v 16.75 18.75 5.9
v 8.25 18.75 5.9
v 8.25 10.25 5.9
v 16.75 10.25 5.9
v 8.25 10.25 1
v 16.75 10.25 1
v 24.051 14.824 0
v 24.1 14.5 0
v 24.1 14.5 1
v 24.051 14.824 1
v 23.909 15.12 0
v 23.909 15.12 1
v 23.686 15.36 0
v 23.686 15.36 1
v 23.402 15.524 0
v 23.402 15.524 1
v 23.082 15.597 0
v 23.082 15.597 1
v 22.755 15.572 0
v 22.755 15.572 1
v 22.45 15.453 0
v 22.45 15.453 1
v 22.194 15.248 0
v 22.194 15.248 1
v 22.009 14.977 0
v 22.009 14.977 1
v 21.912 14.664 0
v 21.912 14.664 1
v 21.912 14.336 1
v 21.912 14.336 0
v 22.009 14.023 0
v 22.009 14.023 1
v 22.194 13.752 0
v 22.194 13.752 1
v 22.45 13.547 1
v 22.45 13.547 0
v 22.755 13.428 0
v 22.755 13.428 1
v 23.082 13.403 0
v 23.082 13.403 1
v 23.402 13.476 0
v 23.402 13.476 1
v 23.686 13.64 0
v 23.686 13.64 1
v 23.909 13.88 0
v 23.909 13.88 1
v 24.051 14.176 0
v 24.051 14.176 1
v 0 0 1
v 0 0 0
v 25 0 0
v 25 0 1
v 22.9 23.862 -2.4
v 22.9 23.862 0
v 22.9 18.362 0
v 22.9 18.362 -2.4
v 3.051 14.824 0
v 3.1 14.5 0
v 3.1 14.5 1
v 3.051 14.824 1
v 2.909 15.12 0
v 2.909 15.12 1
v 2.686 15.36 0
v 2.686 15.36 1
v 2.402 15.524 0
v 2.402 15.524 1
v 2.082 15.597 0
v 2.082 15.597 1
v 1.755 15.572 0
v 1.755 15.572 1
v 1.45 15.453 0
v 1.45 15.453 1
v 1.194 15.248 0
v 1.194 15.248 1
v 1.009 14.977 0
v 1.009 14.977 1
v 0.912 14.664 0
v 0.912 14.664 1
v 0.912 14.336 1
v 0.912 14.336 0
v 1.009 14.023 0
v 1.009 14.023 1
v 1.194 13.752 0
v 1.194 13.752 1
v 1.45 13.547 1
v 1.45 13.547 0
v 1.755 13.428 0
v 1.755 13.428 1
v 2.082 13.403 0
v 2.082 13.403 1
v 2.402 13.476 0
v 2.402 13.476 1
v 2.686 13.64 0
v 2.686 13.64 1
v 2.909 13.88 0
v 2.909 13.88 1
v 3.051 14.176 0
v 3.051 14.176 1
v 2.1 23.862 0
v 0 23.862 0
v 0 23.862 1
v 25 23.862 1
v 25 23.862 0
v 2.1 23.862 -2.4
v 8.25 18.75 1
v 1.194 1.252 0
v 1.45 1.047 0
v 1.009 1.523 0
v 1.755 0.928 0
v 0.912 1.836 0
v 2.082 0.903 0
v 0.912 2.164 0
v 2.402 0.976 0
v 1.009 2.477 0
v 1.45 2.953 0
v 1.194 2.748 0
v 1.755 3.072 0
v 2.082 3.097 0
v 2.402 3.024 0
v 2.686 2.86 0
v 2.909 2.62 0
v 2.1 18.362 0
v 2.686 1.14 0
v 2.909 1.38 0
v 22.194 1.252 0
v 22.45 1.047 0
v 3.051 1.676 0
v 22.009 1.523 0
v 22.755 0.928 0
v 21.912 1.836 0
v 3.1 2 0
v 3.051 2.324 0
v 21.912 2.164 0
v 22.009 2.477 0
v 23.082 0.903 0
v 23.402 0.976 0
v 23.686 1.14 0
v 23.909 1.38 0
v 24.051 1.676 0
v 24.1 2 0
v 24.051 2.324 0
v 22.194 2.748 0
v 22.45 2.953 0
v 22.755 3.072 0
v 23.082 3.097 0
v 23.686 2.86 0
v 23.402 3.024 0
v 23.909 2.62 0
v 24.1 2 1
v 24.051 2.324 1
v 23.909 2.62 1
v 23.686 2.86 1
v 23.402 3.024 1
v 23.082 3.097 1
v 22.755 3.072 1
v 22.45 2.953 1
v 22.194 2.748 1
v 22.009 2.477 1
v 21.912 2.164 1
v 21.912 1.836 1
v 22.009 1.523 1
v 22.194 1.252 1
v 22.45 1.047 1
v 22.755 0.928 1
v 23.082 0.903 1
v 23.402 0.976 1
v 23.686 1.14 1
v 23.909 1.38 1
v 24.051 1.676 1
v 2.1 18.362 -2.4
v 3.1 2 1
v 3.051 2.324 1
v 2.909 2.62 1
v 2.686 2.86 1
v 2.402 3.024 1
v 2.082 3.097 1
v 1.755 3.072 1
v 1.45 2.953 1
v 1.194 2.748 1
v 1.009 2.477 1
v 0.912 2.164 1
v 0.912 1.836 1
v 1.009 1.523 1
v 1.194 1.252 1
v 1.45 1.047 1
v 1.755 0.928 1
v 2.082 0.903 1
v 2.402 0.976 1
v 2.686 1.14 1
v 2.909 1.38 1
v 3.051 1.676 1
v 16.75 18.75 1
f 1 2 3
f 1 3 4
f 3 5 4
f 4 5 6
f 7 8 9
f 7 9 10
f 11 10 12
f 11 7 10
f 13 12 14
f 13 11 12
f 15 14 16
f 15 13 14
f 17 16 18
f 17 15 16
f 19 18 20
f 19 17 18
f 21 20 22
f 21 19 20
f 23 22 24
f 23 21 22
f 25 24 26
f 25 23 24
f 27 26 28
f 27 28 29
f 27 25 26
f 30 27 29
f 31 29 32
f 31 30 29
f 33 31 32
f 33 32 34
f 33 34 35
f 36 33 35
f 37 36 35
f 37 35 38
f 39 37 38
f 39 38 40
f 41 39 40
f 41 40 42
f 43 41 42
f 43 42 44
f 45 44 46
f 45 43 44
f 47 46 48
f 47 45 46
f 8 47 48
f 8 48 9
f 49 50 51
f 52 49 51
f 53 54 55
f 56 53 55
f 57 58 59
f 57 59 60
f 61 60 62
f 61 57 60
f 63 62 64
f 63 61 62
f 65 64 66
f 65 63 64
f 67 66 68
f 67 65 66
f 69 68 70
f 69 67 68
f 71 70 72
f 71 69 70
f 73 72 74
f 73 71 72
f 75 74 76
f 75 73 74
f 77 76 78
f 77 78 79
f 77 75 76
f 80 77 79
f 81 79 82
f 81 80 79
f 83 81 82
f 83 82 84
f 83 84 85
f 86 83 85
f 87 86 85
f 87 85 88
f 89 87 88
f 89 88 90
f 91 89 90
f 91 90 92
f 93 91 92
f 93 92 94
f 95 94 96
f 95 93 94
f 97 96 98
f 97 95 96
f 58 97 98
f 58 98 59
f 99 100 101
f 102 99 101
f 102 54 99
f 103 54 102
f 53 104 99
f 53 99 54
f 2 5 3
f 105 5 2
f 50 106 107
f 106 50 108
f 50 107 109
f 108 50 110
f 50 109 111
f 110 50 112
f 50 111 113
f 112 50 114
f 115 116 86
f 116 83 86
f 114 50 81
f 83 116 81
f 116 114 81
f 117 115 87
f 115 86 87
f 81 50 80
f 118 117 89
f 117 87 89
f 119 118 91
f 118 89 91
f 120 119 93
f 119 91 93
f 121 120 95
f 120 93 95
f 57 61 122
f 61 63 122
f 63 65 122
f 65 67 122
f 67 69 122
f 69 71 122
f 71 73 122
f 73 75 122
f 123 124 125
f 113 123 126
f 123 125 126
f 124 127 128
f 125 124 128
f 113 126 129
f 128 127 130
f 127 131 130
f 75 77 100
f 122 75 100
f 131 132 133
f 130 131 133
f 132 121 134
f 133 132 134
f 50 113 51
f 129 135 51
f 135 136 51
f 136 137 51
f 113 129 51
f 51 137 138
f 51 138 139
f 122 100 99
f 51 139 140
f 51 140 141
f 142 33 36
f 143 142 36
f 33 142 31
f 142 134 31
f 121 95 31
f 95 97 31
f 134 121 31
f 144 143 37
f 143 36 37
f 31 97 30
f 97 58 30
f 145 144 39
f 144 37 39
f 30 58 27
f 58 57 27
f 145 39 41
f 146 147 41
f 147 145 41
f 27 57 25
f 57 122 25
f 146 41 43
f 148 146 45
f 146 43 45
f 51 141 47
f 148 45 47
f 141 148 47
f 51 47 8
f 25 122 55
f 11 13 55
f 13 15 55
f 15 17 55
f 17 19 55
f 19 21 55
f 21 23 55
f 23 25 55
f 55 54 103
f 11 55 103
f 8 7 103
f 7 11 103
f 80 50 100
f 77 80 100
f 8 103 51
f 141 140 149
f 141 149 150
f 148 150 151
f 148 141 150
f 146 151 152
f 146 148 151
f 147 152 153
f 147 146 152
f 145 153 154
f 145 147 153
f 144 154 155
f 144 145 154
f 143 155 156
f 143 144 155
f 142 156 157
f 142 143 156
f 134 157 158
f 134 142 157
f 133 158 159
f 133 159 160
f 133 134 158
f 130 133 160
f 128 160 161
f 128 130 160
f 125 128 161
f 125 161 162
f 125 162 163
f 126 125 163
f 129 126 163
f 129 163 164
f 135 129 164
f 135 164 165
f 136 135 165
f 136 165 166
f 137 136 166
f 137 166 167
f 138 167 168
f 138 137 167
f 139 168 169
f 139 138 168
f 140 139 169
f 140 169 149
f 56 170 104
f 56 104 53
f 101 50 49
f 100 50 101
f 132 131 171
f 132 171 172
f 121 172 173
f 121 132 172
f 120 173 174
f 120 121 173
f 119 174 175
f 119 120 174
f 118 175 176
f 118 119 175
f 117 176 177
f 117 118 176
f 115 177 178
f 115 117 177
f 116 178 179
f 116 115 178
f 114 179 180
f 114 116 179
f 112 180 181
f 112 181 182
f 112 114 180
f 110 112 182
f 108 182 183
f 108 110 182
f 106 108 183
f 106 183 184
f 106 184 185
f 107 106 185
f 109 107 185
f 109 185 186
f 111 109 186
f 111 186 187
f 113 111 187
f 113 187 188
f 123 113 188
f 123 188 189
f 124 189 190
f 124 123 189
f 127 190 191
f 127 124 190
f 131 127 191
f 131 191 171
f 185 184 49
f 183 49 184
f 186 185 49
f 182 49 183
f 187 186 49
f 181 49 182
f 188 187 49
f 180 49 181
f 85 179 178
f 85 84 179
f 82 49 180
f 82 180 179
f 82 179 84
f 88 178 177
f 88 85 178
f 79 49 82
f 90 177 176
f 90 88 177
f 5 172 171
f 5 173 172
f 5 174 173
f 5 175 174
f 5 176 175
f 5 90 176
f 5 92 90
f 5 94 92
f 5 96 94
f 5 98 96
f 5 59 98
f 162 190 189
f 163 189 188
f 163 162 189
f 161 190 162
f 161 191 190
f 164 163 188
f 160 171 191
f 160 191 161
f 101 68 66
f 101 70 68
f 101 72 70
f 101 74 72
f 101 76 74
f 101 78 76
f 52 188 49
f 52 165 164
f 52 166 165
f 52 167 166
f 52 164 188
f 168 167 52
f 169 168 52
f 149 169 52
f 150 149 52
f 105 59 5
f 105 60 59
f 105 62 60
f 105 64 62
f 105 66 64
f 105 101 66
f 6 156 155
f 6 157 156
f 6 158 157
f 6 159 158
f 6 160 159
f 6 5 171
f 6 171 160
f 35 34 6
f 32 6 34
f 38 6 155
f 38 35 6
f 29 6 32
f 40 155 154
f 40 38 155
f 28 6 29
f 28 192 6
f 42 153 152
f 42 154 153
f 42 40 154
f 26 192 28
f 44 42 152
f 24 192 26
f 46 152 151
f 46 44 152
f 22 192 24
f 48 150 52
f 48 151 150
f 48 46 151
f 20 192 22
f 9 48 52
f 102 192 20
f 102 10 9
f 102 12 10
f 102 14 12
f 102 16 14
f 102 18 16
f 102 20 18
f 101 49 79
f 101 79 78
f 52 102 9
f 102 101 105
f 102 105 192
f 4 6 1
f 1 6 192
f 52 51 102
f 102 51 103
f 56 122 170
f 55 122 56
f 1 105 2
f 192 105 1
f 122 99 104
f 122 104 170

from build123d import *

# Parameters (mm, degrees)
F0_W     = 25
F0_H     = 23.862
F0_R     = 1.1
F1_DEPTH = 1
F2_W     = 20.8
F2_H     = 5.5
F3_DEPTH = 2.4
F4_W     = 8.5
F4_H     = 8.5
F5_DEPTH = 4.9


with BuildPart() as f1:
    # F0 (on Top) → F1 (new body)
    with BuildSketch(Plane.XY):
        with Locations((12.5, 11.931)):
            Rectangle(F0_W, F0_H)
        with Locations((2, 2)):
            Circle(F0_R, mode=Mode.SUBTRACT)
        with Locations((23, 2)):
            Circle(F0_R, mode=Mode.SUBTRACT)
        with Locations((2, 14.5)):
            Circle(F0_R, mode=Mode.SUBTRACT)
        with Locations((23, 14.5)):
            Circle(F0_R, mode=Mode.SUBTRACT)
    extrude(amount=F1_DEPTH)

    # F2 (on face) → F3 (join)
    with BuildSketch(Plane(origin=(0, 0, 0), x_dir=(1, 0, 0), z_dir=(0, 0, -1))):
        with Locations((12.5, -21.112)):
            Rectangle(F2_W, F2_H)
    extrude(amount=F3_DEPTH)

    # F4 (on face) → F5 (join)
    with BuildSketch(Plane.XY.offset(1)):
        with Locations((12.5, 14.5)):
            Rectangle(F4_W, F4_H)
    extrude(amount=F5_DEPTH)


solid = f1.part
